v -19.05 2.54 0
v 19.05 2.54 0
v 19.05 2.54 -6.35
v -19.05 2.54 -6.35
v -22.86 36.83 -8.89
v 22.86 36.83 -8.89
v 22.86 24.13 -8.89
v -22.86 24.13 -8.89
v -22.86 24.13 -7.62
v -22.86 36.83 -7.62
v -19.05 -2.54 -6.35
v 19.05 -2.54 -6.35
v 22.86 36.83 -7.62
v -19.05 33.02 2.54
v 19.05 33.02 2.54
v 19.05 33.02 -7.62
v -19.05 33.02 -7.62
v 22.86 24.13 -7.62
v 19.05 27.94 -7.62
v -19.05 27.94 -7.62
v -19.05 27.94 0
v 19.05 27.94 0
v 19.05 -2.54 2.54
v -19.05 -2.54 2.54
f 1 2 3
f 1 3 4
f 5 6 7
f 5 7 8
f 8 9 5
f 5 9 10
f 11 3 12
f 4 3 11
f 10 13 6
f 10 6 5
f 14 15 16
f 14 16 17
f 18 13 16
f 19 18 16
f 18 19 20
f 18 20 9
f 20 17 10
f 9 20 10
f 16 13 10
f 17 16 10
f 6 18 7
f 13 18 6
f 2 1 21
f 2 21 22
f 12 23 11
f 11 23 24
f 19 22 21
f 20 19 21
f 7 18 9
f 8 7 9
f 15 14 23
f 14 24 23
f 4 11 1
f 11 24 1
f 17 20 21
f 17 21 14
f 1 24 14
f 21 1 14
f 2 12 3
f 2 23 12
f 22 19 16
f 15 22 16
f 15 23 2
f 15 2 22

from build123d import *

# Parameters (mm, degrees)
SKETCH1_W           = 38.1
SKETCH1_H           = 5.08
BOSS_EXTRUDE1_DEPTH = 2.54
SKETCH2_W           = 38.1
SKETCH2_H           = 2.54
BOSS_EXTRUDE2_DEPTH = 30.48
SKETCH3_W           = 38.1
SKETCH3_H           = 5.08
BOSS_EXTRUDE3_DEPTH = 7.62
SKETCH4_W           = 38.1
SKETCH4_H           = 5.08
BOSS_EXTRUDE4_DEPTH = 6.35
SKETCH5_W           = 45.72
SKETCH5_H           = 12.7
BOSS_EXTRUDE5_DEPTH = 1.27


with BuildPart() as part:
    # Sketch1 → Boss-Extrude1 (new body)
    with BuildSketch(Plane.XY):
        Rectangle(SKETCH1_W, SKETCH1_H)
    extrude(amount=BOSS_EXTRUDE1_DEPTH)

    # Sketch2 → Boss-Extrude2 (add)
    with BuildSketch(Plane(origin=(0, 2.54, 0), x_dir=(1, 0, 0), z_dir=(0, 1, 0))):
        with Locations((0, -1.27)):
            Rectangle(SKETCH2_W, SKETCH2_H)
    extrude(amount=BOSS_EXTRUDE2_DEPTH)

    # Sketch3 → Boss-Extrude3 (add)
    with BuildSketch(Plane(origin=(0, 0, 0), x_dir=(-1, 0, 0), z_dir=(0, 0, -1))):
        with Locations((0, 30.48)):
            Rectangle(SKETCH3_W, SKETCH3_H)
    extrude(amount=BOSS_EXTRUDE3_DEPTH)

    # Sketch4 → Boss-Extrude4 (add)
    with BuildSketch(Plane(origin=(0, 0, 0), x_dir=(-1, 0, 0), z_dir=(0, 0, -1))):
        Rectangle(SKETCH4_W, SKETCH4_H)
    extrude(amount=BOSS_EXTRUDE4_DEPTH)

    # Sketch5 → Boss-Extrude5 (add)
    with BuildSketch(Plane(origin=(0, 0, -7.62), x_dir=(-1, 0, 0), z_dir=(0, 0, -1))):
        with Locations((0, 30.48)):
            Rectangle(SKETCH5_W, SKETCH5_H)
    extrude(amount=BOSS_EXTRUDE5_DEPTH)


solid = part.part
